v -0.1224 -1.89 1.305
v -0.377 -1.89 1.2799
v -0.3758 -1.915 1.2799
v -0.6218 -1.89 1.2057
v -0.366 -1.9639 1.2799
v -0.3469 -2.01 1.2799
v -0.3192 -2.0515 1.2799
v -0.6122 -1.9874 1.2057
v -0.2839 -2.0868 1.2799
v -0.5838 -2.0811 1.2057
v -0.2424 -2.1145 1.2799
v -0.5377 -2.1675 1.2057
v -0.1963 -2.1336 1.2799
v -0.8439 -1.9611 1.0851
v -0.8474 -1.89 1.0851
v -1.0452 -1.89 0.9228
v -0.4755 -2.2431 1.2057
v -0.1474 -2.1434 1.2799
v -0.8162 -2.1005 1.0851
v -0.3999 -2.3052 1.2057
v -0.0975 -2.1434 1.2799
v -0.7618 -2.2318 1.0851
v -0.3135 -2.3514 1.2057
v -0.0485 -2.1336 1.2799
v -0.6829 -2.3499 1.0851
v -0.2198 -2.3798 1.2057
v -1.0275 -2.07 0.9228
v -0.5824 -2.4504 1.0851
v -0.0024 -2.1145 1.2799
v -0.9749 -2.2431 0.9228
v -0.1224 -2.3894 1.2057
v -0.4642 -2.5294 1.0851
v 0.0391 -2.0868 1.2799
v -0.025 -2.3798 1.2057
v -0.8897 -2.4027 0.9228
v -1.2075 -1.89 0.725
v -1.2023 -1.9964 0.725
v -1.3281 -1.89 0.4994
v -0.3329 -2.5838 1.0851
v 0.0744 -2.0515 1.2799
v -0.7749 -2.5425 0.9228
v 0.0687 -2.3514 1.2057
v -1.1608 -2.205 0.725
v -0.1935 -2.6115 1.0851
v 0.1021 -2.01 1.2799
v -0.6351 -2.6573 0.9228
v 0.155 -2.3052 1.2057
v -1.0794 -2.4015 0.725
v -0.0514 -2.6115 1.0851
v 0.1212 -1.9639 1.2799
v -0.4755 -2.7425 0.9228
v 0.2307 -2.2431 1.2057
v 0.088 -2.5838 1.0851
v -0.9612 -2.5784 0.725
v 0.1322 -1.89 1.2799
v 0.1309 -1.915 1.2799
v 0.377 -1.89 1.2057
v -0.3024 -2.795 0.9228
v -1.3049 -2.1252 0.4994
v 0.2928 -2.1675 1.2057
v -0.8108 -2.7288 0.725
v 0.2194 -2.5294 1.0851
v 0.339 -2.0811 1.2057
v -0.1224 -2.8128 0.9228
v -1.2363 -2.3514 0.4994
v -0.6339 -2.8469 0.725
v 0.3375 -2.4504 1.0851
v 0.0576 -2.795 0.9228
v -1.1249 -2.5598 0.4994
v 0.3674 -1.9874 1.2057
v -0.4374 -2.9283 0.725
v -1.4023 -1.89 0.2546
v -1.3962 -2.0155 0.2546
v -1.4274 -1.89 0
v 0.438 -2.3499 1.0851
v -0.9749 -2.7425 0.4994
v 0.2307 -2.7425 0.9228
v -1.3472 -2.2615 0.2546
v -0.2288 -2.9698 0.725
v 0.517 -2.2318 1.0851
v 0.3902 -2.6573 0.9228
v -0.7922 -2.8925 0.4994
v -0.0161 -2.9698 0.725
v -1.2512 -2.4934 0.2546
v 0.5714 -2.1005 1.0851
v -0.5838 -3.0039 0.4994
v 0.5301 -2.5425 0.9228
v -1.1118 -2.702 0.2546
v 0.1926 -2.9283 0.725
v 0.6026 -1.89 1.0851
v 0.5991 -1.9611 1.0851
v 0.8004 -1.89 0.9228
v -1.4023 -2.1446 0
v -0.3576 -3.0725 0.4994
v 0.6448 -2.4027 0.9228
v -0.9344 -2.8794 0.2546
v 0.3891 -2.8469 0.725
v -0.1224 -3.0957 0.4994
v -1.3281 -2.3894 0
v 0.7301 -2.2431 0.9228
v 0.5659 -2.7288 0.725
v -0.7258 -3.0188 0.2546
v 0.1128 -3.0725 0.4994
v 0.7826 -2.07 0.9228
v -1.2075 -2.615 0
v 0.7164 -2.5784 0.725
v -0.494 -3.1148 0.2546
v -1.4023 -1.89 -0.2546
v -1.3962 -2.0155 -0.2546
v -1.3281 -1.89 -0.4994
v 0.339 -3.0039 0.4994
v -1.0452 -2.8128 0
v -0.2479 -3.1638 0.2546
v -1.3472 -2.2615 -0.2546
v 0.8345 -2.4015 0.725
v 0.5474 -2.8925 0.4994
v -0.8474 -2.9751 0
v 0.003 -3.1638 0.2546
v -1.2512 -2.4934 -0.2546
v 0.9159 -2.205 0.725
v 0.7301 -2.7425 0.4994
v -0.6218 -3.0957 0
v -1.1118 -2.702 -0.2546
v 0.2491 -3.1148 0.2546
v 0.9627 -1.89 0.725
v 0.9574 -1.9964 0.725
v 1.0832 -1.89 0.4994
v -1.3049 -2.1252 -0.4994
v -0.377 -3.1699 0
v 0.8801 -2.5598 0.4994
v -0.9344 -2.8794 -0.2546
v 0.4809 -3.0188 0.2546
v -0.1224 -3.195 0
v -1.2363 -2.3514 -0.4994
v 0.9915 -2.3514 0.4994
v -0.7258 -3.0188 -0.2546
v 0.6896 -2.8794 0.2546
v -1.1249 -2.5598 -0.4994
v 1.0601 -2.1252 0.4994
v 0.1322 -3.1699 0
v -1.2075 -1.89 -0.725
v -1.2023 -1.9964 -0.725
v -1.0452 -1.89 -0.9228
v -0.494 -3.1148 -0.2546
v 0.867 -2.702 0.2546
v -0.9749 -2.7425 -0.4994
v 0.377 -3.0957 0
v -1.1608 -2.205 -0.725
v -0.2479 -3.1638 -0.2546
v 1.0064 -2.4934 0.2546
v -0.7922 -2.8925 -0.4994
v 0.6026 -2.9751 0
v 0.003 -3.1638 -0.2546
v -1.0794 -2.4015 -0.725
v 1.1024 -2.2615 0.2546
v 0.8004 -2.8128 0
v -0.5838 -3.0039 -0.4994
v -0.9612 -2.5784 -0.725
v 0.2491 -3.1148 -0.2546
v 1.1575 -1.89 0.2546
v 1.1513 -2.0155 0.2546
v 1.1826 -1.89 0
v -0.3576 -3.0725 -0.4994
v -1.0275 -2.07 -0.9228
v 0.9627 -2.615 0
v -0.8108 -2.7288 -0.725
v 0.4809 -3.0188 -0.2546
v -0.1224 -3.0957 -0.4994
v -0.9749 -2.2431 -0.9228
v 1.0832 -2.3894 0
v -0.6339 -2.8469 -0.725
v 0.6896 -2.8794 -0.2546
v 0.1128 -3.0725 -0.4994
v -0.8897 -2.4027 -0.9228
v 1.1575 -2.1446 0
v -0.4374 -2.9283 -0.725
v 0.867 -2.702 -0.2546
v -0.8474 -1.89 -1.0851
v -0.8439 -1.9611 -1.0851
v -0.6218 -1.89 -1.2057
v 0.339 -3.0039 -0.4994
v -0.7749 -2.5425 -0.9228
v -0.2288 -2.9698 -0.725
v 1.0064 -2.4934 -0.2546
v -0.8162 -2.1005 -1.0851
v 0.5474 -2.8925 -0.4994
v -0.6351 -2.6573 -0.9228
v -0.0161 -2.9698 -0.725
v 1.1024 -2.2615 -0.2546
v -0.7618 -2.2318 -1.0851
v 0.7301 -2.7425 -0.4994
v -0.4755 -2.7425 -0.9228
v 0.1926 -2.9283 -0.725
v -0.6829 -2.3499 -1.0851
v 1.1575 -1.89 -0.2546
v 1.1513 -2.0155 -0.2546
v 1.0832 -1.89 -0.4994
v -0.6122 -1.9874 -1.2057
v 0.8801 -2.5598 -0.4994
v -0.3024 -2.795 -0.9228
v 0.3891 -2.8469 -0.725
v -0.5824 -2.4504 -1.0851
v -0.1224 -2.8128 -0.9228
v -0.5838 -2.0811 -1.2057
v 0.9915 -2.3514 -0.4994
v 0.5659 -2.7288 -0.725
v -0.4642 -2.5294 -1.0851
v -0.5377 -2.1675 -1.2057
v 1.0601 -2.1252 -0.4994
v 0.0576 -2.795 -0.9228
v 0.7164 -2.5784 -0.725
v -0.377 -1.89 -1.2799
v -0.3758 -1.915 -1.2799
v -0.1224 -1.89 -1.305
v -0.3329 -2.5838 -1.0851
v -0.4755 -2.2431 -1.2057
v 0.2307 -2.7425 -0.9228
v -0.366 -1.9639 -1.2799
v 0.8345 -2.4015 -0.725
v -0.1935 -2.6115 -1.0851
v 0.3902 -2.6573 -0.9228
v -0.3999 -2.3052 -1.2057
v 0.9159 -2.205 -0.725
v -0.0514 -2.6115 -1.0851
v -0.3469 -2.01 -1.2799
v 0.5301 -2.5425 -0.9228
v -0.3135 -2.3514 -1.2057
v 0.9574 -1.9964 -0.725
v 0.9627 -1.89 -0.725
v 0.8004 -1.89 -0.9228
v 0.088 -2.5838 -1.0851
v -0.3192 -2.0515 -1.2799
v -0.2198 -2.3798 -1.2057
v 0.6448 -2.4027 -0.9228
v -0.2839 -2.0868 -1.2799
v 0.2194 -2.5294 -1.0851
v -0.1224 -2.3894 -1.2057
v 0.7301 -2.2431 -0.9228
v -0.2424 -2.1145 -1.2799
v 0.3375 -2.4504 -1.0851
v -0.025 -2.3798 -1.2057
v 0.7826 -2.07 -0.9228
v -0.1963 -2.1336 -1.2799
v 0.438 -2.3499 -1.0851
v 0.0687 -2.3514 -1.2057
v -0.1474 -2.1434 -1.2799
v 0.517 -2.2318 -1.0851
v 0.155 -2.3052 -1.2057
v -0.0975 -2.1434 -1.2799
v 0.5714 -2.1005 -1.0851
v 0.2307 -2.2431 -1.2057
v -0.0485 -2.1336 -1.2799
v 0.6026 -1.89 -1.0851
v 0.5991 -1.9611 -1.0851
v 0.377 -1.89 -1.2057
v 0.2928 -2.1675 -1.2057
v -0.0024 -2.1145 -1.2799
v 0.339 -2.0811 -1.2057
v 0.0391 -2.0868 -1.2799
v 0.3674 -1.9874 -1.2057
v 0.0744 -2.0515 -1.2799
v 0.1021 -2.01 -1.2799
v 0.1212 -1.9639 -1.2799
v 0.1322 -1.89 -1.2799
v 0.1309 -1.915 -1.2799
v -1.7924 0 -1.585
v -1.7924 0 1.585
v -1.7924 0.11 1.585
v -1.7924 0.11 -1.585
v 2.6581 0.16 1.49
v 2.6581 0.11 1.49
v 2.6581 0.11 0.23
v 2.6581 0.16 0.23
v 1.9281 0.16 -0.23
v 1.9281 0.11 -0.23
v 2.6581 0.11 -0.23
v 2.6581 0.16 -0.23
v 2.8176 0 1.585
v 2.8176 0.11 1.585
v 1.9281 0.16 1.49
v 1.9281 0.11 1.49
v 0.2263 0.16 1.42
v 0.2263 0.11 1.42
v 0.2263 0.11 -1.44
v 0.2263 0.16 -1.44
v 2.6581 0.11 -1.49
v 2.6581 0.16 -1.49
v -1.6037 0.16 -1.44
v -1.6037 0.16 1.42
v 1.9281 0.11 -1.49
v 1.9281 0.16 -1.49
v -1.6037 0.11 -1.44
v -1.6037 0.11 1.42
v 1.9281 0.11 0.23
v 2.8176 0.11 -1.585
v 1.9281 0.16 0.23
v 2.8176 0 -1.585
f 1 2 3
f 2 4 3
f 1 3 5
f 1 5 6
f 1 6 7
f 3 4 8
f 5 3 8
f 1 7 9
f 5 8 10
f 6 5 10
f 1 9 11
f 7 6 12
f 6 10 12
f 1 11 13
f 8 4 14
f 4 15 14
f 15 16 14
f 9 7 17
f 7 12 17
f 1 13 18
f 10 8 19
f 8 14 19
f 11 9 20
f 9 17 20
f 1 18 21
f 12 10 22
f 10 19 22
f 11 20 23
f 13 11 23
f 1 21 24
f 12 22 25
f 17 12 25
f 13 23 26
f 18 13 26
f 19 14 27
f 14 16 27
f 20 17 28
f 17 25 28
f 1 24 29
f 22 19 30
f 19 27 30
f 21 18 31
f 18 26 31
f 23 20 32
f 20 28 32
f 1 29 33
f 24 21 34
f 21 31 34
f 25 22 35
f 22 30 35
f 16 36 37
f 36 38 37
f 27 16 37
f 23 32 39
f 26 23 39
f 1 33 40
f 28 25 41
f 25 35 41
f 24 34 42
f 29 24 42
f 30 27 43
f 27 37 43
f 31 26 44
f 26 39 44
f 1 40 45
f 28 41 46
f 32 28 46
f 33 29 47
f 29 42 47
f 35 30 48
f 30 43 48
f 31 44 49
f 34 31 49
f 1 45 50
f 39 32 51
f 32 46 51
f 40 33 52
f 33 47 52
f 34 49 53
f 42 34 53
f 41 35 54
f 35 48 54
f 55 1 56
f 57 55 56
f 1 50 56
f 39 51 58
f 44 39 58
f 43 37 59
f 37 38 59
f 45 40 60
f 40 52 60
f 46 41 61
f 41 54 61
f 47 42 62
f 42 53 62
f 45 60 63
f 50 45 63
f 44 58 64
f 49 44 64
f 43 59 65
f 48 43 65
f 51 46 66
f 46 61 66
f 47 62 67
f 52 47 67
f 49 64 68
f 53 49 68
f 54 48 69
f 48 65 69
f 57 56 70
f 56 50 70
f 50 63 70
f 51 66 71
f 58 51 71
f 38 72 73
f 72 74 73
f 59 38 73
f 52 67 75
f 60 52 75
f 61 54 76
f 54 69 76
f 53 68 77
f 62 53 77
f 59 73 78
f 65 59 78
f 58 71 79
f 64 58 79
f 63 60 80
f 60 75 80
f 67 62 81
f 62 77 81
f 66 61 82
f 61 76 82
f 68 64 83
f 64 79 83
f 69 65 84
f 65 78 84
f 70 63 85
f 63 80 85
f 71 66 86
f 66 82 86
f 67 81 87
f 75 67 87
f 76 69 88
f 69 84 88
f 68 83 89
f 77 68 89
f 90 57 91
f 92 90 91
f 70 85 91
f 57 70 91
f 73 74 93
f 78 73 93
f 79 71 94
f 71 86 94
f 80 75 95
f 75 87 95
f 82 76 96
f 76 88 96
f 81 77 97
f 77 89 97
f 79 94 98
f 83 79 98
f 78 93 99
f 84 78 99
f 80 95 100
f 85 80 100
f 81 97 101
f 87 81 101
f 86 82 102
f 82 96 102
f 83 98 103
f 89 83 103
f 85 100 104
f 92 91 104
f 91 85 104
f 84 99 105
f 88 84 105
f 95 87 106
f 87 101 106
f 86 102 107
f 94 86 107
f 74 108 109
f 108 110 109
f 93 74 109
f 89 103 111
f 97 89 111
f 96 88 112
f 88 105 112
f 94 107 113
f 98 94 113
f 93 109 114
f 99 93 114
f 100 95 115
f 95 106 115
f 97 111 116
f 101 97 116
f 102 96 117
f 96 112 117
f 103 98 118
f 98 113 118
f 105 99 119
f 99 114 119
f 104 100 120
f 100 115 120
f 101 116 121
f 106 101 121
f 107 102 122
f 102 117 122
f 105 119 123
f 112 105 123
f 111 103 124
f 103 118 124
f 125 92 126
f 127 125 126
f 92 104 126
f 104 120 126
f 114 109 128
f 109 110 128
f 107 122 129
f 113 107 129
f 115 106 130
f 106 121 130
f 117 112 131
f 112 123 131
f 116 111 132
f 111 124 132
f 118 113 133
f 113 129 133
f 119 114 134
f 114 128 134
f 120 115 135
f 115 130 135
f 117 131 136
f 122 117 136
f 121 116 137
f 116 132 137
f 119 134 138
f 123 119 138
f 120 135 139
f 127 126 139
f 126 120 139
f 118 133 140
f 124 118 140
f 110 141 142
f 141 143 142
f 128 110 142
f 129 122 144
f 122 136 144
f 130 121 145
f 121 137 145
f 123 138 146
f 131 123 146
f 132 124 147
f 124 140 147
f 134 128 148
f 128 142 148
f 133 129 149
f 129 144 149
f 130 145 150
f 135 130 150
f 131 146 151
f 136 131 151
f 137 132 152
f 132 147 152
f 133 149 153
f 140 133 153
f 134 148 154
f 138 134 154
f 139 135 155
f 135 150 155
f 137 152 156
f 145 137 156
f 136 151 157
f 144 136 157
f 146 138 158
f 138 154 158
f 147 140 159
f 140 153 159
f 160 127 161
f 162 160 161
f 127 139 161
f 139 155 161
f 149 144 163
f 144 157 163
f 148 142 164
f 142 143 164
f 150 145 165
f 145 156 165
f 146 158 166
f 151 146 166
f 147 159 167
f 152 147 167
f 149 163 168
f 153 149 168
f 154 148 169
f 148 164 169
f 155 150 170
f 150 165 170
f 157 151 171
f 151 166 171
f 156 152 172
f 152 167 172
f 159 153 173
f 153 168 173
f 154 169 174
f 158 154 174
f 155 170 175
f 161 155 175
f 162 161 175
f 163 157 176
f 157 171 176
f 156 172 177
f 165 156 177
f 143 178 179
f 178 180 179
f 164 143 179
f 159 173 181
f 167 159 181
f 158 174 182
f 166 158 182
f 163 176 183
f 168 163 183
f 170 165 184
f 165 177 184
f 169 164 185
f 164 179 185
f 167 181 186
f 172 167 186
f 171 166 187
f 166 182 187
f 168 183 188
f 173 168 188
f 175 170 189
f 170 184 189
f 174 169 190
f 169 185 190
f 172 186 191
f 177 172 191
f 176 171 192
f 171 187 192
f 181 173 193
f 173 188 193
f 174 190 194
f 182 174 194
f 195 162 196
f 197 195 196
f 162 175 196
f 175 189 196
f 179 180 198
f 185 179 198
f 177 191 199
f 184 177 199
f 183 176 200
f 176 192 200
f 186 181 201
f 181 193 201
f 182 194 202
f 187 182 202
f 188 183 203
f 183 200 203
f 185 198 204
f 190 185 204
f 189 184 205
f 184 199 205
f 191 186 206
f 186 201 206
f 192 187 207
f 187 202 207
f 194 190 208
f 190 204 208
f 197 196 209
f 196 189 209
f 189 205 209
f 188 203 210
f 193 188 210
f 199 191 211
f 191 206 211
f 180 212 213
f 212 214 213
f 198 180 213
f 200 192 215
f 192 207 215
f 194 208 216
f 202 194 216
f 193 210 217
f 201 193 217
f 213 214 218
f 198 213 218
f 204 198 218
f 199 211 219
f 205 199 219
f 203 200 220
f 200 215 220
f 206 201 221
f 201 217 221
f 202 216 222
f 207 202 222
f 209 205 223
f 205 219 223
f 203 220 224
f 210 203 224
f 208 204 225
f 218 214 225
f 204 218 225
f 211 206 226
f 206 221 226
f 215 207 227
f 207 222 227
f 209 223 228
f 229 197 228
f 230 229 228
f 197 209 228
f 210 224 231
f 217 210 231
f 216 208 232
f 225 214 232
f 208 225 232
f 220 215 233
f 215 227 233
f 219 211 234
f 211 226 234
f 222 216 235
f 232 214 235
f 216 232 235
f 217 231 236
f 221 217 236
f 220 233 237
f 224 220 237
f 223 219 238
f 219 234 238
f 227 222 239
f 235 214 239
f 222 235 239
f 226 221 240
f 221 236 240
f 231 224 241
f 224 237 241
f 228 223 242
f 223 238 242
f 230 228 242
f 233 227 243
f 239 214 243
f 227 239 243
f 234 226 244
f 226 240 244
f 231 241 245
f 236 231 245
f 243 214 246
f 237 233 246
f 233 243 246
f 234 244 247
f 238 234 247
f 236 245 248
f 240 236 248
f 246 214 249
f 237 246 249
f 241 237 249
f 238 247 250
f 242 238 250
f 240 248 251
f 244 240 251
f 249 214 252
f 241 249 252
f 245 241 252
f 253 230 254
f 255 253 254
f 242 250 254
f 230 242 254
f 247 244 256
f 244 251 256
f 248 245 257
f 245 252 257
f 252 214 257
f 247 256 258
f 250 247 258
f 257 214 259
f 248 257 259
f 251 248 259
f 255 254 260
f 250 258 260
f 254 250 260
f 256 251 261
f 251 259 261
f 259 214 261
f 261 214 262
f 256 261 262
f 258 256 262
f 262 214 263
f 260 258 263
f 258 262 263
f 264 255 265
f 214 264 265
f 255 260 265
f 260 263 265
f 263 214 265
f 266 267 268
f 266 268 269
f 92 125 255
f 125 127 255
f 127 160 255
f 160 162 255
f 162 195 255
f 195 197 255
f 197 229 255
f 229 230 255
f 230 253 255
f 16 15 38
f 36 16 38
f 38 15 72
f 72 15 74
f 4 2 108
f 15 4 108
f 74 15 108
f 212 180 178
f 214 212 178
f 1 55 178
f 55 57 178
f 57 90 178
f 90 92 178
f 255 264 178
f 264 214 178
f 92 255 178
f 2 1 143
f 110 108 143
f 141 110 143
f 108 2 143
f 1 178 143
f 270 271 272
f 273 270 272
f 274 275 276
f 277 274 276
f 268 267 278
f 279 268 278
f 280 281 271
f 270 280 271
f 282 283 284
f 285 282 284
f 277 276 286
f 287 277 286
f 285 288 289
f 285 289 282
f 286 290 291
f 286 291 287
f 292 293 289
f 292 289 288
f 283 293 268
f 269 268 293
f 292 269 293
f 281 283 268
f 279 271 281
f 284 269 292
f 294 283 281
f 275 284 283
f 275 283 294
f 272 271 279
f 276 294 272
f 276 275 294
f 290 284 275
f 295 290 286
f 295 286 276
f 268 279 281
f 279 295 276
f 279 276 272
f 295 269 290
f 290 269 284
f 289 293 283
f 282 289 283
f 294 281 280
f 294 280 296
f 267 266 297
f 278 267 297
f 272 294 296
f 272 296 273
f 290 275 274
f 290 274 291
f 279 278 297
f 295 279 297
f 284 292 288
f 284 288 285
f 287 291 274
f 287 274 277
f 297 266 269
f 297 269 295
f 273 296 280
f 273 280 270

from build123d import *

# Parameters (mm, degrees)
SKETCH1_W           = 4.61
SKETCH1_H           = 3.17
BOSS_EXTRUDE1_DEPTH = 0.11
SKETCH3_W           = 1.83
SKETCH3_H           = 2.86
BOSS_EXTRUDE2_DEPTH = 0.16
SKETCH4_W           = 0.73
SKETCH4_H           = 1.26
BOSS_EXTRUDE3_DEPTH = 0.16
REVOLVE3_ANGLE      = 180


with BuildPart() as part:
    # Sketch1 → Boss-Extrude1 (new body)
    with BuildSketch(Plane(origin=(0, 0, 0), x_dir=(1, 0, 0), z_dir=(0, 1, 0))):
        with Locations((0.512582768, 0)):
            Rectangle(SKETCH1_W, SKETCH1_H)
    extrude(amount=BOSS_EXTRUDE1_DEPTH)

    # Sketch3 → Boss-Extrude2 (add)
    with BuildSketch(Plane(origin=(0, 0, 0), x_dir=(1, 0, 0), z_dir=(0, 1, 0))):
        with Locations((-0.688690494, 0.01)):
            Rectangle(SKETCH3_W, SKETCH3_H)
    extrude(amount=BOSS_EXTRUDE2_DEPTH)

    # Sketch4 → Boss-Extrude3 (add)
    with BuildSketch(Plane(origin=(0, 0, 0), x_dir=(1, 0, 0), z_dir=(0, 1, 0))):
        with Locations((2.293148726, 0.86)):
            Rectangle(SKETCH4_W, SKETCH4_H)
        with Locations((2.293148726, -0.86)):
            Rectangle(SKETCH4_W, SKETCH4_H)
    extrude(amount=BOSS_EXTRUDE3_DEPTH)


with BuildPart() as body_2:
    # Sketch6 → Revolve3 (revolve)
    with BuildSketch(Plane(origin=(0, -1.89, 0), x_dir=(-1, 0, 0), z_dir=(0, -1, 0))):
        with BuildLine():
            Line((0.122417232, 1.305), (0.122417232, -1.305))
            ThreePointArc((0.122417232, -1.305), (1.427417232, 0), (0.122417232, 1.305))
        make_face()
    revolve(axis=Axis((-0.122417232, -1.89, -1.305), (0, 0, 1)), revolution_arc=REVOLVE3_ANGLE)


solid = Compound([part.part, body_2.part])
